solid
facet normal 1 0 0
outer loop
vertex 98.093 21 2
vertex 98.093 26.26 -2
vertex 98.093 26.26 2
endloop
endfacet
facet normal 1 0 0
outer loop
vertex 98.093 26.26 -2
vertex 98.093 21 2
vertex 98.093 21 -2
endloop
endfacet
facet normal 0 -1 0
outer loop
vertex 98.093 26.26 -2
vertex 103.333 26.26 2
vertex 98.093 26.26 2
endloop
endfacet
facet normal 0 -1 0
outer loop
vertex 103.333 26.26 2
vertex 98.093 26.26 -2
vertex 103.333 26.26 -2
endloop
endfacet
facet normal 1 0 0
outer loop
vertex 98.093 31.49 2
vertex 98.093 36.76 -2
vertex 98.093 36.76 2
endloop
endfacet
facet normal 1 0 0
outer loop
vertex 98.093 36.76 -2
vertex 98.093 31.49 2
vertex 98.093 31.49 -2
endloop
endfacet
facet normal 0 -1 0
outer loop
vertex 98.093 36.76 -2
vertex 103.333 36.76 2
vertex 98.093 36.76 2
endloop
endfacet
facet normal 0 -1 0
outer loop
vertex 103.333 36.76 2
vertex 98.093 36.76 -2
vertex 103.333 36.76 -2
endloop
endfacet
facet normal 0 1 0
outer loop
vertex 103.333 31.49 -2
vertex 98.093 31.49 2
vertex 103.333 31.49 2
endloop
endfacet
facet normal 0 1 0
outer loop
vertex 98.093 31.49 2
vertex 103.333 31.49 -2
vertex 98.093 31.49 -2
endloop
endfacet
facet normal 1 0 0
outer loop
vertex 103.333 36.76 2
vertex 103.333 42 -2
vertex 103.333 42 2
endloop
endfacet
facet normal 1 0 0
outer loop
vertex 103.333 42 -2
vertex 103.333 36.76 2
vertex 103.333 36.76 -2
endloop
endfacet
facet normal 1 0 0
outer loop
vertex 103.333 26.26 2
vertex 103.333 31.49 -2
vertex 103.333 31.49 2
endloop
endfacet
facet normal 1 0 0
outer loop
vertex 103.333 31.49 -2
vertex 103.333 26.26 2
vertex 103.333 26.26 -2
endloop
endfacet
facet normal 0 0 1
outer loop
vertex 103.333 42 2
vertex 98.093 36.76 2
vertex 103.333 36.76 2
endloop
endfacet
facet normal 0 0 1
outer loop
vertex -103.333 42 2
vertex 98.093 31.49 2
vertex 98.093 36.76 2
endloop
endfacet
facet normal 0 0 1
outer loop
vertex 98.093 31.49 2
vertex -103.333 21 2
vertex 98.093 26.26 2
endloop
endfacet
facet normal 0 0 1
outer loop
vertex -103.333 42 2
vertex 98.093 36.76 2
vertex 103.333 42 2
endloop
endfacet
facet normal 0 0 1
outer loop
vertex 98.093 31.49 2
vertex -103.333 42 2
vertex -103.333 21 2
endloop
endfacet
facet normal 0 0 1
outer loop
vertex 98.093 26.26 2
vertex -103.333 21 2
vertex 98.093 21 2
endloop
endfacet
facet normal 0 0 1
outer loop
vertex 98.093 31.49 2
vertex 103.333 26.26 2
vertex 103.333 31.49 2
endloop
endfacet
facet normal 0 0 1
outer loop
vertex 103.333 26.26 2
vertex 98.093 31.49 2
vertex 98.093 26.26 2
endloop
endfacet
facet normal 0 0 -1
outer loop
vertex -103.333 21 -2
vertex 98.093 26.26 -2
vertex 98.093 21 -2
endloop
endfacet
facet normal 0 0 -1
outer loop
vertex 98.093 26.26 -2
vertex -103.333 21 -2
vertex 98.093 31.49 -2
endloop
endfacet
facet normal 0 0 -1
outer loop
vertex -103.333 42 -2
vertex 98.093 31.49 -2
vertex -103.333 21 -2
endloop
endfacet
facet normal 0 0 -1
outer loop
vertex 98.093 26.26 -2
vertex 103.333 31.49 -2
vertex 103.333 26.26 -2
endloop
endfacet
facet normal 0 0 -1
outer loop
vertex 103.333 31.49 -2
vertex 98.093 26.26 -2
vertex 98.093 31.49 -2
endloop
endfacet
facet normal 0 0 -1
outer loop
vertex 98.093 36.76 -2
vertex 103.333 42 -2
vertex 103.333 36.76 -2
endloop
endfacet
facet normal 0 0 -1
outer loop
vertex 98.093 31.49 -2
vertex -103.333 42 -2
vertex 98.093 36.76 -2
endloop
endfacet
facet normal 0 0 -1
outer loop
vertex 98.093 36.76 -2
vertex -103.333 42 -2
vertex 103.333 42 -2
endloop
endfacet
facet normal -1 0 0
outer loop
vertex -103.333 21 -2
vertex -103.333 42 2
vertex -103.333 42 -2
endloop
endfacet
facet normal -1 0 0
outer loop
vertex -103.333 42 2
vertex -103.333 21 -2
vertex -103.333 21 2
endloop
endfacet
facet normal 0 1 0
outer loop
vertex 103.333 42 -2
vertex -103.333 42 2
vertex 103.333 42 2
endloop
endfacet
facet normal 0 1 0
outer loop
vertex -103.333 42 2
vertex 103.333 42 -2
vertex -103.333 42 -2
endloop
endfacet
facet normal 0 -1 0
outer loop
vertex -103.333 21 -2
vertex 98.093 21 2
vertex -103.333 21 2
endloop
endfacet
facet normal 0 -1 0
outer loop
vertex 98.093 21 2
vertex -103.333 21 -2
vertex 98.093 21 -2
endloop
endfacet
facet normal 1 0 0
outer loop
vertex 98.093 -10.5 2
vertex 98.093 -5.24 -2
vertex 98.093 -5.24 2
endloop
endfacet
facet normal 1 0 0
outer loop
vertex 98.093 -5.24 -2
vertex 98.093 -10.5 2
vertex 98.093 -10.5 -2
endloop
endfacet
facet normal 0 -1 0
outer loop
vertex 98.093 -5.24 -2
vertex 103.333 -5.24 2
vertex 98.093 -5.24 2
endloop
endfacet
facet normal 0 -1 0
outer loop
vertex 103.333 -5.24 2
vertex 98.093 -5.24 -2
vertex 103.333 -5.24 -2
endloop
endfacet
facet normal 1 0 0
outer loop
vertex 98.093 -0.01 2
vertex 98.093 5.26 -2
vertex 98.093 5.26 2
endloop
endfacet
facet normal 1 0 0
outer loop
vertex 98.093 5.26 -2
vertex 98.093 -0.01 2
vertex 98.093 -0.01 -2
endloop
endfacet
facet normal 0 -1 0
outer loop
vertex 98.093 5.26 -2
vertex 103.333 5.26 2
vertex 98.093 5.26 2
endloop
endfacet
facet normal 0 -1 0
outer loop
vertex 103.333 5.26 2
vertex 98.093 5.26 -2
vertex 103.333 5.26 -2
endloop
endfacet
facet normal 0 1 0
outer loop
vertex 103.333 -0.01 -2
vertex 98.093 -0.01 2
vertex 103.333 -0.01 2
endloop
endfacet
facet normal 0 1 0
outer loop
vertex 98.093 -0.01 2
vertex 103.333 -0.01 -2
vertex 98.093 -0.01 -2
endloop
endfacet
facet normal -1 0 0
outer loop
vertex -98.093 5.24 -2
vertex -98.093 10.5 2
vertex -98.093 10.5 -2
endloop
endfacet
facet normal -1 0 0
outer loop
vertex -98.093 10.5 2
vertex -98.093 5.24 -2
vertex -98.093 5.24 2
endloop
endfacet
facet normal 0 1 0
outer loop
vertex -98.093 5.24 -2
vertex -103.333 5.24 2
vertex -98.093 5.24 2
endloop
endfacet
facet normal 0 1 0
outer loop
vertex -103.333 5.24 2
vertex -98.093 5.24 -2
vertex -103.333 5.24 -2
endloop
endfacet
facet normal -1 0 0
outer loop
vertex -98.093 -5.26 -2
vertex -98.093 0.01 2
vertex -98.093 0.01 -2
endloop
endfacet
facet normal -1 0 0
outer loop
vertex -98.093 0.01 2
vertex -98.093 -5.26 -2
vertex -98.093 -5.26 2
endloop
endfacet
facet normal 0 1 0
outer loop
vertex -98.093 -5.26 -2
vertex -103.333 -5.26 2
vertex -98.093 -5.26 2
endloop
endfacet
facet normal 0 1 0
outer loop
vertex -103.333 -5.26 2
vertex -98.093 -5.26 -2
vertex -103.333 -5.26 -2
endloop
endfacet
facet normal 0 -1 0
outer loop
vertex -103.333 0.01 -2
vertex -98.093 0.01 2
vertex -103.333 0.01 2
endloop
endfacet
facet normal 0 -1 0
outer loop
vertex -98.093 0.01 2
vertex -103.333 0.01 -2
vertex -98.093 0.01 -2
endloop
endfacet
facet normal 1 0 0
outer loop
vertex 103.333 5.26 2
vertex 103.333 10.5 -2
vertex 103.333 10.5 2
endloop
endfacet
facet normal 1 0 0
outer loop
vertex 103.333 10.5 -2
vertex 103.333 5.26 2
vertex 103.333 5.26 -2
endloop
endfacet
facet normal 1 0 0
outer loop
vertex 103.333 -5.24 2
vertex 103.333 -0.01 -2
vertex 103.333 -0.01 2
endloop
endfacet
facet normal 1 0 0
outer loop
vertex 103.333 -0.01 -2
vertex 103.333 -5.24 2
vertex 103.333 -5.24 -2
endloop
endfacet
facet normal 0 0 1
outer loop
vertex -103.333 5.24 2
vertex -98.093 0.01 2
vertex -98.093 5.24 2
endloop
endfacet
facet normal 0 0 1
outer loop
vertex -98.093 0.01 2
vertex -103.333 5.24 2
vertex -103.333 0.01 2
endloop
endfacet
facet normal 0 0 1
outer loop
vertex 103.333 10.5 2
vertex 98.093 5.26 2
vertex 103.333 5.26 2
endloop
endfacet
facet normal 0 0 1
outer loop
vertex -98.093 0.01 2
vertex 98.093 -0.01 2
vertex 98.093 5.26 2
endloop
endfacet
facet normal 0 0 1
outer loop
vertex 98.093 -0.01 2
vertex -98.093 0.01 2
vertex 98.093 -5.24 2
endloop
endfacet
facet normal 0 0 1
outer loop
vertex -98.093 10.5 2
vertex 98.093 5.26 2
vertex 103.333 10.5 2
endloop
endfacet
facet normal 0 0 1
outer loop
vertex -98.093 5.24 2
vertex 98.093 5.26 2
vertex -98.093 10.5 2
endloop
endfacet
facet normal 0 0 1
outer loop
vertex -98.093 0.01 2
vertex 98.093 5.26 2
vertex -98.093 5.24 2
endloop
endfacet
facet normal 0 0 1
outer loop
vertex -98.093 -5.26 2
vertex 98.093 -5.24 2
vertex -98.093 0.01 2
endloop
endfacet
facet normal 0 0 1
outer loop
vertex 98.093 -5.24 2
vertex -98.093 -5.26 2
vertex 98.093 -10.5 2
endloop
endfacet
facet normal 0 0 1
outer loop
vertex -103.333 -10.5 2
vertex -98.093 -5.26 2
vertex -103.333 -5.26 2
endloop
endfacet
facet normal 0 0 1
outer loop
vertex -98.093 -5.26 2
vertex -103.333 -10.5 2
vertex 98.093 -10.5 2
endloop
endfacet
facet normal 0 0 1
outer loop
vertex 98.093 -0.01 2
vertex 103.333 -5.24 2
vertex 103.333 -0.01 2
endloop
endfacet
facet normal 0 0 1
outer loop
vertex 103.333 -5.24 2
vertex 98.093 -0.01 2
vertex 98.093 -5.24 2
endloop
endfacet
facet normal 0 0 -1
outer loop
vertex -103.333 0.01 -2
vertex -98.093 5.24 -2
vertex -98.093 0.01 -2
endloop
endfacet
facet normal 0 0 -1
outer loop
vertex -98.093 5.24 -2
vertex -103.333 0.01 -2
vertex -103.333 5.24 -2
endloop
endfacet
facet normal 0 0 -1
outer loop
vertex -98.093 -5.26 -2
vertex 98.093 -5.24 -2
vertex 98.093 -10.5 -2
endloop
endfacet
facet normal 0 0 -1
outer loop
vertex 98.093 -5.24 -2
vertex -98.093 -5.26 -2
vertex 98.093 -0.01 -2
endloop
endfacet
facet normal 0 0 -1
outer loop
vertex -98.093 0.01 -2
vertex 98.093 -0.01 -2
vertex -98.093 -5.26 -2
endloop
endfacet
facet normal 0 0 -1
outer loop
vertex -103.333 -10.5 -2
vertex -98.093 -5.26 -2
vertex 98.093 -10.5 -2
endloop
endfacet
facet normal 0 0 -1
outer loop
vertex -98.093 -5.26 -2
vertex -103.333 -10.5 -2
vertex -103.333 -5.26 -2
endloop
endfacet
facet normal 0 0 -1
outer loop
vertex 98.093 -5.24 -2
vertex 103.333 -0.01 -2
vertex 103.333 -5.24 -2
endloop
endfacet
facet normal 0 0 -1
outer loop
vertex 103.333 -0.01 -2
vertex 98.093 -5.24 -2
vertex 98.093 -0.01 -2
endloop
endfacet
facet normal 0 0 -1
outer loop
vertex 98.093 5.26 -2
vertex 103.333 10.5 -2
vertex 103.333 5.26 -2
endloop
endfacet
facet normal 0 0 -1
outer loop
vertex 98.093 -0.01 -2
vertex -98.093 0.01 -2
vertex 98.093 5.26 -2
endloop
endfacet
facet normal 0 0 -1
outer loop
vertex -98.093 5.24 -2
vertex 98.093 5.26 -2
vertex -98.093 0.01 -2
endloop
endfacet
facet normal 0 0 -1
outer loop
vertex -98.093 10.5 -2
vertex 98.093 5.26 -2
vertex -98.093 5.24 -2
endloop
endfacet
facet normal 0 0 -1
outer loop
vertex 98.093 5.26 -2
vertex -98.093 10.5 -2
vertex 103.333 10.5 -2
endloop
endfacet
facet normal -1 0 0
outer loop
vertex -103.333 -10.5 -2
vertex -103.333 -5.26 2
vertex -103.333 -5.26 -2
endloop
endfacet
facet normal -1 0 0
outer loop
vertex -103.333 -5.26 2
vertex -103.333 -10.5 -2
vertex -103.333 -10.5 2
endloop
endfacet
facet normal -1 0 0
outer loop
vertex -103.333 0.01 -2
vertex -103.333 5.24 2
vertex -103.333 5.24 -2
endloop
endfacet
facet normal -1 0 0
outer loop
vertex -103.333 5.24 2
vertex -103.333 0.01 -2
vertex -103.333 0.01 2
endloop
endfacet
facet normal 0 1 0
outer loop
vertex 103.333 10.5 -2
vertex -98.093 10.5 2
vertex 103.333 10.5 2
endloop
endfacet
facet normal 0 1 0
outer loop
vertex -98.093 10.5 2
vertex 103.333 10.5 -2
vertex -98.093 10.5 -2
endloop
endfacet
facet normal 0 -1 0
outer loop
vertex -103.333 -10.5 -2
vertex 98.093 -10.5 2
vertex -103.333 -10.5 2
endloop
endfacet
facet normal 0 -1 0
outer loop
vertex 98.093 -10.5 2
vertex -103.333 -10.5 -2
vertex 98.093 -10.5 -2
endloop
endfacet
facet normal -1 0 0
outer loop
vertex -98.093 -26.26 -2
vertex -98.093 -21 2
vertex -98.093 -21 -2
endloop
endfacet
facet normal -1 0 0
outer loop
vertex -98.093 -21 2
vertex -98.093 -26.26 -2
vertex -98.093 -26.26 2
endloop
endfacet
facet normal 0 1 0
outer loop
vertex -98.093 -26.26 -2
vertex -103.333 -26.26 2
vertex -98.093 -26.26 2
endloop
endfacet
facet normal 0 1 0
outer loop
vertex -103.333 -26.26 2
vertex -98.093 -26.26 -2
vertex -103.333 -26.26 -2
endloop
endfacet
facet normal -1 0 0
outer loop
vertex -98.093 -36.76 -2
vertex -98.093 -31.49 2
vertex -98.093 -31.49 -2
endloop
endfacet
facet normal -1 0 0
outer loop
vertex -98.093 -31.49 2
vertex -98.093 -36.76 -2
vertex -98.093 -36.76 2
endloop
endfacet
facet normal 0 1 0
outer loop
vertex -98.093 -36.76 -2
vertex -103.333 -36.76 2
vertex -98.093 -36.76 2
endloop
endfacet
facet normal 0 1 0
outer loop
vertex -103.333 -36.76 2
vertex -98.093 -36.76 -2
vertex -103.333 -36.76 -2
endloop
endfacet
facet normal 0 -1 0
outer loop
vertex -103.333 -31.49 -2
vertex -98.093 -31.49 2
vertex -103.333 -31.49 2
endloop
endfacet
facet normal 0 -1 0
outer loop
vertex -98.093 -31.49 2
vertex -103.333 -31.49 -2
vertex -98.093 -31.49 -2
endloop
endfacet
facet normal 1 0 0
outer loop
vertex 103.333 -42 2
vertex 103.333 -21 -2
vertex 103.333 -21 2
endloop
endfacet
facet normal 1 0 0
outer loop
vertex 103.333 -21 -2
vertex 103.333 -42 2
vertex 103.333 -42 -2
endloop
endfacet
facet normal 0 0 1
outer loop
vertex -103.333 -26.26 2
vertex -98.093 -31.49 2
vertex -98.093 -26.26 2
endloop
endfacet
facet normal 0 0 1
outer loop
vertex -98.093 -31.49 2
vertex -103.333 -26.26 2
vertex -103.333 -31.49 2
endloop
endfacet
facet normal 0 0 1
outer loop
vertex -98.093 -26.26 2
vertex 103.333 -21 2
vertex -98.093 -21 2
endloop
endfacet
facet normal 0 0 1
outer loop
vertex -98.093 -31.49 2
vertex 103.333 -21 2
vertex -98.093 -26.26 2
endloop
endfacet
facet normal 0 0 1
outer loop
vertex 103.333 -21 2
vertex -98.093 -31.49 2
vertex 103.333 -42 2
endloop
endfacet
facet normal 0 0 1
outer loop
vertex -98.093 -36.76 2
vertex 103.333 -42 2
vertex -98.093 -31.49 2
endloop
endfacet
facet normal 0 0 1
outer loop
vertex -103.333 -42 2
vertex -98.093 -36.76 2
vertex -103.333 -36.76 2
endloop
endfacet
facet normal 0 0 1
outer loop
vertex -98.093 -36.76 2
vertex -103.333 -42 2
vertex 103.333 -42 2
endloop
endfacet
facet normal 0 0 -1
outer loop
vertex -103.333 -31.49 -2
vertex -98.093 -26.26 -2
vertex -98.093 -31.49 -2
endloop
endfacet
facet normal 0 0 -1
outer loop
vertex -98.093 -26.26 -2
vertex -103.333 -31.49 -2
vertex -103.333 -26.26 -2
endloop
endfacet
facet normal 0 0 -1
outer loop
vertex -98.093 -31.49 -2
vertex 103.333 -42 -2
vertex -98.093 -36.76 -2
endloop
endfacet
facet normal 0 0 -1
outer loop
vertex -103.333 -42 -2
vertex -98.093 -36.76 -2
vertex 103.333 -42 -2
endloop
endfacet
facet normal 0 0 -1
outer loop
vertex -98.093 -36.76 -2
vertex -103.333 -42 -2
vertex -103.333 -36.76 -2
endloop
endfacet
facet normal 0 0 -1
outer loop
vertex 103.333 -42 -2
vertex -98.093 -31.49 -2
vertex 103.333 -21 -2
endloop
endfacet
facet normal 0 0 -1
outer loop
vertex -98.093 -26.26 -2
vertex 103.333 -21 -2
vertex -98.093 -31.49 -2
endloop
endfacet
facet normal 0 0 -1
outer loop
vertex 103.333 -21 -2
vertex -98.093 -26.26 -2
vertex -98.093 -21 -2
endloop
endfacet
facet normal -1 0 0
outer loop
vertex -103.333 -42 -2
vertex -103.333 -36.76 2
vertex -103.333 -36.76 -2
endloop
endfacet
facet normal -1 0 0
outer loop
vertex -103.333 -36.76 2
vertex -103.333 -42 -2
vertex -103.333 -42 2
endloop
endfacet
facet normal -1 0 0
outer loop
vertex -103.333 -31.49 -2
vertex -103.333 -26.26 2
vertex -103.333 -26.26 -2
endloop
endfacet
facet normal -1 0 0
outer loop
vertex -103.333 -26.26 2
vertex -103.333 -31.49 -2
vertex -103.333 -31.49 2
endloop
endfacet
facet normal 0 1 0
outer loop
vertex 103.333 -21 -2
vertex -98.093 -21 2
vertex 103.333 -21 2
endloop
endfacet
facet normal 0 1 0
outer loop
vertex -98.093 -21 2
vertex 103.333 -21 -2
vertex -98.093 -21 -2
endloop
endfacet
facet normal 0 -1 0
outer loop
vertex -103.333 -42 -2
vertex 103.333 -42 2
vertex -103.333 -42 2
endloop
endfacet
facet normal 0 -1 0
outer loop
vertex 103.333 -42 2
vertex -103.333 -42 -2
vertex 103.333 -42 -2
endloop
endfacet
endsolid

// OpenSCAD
length = 620;
length3 = length / 3;
height = 21;
thick = 4;
eps = 0.01;


translate([0, height*1.5, 0])
  Piece(false, true);
translate([0, 0, 0])
  Piece(true, true);
translate([0, -height*1.5, 0])
  Piece(true, false);

module Piece(left, right) {
  difference() {
    cube([length3, height, thick], center=true);
    if (right) {
      translate([length3/2, 0, 0])
        #Sawtooth(4, height, thick, false);
    }
    if (left) {
      translate([-length3/2, 0, 0])
        #Sawtooth(4, height, thick, true);
    }
  }
}

module Sawtooth(num, total_height, thickness, reverse) {
  inset = total_height / num;
  bottom = -total_height/2 + inset/2;
  flip = reverse ? 1: 0;
  right = reverse ? 1: -1;
  rotate([180*flip, 0, 0])
    translate([right*(inset/2 - eps), 0, 0])
      for (y = [0: 2: num-1]) {
        translate([0, bottom + inset * y, 0])
          cube([inset, inset+2*eps, thick+2*eps], center=true);
      }
}
